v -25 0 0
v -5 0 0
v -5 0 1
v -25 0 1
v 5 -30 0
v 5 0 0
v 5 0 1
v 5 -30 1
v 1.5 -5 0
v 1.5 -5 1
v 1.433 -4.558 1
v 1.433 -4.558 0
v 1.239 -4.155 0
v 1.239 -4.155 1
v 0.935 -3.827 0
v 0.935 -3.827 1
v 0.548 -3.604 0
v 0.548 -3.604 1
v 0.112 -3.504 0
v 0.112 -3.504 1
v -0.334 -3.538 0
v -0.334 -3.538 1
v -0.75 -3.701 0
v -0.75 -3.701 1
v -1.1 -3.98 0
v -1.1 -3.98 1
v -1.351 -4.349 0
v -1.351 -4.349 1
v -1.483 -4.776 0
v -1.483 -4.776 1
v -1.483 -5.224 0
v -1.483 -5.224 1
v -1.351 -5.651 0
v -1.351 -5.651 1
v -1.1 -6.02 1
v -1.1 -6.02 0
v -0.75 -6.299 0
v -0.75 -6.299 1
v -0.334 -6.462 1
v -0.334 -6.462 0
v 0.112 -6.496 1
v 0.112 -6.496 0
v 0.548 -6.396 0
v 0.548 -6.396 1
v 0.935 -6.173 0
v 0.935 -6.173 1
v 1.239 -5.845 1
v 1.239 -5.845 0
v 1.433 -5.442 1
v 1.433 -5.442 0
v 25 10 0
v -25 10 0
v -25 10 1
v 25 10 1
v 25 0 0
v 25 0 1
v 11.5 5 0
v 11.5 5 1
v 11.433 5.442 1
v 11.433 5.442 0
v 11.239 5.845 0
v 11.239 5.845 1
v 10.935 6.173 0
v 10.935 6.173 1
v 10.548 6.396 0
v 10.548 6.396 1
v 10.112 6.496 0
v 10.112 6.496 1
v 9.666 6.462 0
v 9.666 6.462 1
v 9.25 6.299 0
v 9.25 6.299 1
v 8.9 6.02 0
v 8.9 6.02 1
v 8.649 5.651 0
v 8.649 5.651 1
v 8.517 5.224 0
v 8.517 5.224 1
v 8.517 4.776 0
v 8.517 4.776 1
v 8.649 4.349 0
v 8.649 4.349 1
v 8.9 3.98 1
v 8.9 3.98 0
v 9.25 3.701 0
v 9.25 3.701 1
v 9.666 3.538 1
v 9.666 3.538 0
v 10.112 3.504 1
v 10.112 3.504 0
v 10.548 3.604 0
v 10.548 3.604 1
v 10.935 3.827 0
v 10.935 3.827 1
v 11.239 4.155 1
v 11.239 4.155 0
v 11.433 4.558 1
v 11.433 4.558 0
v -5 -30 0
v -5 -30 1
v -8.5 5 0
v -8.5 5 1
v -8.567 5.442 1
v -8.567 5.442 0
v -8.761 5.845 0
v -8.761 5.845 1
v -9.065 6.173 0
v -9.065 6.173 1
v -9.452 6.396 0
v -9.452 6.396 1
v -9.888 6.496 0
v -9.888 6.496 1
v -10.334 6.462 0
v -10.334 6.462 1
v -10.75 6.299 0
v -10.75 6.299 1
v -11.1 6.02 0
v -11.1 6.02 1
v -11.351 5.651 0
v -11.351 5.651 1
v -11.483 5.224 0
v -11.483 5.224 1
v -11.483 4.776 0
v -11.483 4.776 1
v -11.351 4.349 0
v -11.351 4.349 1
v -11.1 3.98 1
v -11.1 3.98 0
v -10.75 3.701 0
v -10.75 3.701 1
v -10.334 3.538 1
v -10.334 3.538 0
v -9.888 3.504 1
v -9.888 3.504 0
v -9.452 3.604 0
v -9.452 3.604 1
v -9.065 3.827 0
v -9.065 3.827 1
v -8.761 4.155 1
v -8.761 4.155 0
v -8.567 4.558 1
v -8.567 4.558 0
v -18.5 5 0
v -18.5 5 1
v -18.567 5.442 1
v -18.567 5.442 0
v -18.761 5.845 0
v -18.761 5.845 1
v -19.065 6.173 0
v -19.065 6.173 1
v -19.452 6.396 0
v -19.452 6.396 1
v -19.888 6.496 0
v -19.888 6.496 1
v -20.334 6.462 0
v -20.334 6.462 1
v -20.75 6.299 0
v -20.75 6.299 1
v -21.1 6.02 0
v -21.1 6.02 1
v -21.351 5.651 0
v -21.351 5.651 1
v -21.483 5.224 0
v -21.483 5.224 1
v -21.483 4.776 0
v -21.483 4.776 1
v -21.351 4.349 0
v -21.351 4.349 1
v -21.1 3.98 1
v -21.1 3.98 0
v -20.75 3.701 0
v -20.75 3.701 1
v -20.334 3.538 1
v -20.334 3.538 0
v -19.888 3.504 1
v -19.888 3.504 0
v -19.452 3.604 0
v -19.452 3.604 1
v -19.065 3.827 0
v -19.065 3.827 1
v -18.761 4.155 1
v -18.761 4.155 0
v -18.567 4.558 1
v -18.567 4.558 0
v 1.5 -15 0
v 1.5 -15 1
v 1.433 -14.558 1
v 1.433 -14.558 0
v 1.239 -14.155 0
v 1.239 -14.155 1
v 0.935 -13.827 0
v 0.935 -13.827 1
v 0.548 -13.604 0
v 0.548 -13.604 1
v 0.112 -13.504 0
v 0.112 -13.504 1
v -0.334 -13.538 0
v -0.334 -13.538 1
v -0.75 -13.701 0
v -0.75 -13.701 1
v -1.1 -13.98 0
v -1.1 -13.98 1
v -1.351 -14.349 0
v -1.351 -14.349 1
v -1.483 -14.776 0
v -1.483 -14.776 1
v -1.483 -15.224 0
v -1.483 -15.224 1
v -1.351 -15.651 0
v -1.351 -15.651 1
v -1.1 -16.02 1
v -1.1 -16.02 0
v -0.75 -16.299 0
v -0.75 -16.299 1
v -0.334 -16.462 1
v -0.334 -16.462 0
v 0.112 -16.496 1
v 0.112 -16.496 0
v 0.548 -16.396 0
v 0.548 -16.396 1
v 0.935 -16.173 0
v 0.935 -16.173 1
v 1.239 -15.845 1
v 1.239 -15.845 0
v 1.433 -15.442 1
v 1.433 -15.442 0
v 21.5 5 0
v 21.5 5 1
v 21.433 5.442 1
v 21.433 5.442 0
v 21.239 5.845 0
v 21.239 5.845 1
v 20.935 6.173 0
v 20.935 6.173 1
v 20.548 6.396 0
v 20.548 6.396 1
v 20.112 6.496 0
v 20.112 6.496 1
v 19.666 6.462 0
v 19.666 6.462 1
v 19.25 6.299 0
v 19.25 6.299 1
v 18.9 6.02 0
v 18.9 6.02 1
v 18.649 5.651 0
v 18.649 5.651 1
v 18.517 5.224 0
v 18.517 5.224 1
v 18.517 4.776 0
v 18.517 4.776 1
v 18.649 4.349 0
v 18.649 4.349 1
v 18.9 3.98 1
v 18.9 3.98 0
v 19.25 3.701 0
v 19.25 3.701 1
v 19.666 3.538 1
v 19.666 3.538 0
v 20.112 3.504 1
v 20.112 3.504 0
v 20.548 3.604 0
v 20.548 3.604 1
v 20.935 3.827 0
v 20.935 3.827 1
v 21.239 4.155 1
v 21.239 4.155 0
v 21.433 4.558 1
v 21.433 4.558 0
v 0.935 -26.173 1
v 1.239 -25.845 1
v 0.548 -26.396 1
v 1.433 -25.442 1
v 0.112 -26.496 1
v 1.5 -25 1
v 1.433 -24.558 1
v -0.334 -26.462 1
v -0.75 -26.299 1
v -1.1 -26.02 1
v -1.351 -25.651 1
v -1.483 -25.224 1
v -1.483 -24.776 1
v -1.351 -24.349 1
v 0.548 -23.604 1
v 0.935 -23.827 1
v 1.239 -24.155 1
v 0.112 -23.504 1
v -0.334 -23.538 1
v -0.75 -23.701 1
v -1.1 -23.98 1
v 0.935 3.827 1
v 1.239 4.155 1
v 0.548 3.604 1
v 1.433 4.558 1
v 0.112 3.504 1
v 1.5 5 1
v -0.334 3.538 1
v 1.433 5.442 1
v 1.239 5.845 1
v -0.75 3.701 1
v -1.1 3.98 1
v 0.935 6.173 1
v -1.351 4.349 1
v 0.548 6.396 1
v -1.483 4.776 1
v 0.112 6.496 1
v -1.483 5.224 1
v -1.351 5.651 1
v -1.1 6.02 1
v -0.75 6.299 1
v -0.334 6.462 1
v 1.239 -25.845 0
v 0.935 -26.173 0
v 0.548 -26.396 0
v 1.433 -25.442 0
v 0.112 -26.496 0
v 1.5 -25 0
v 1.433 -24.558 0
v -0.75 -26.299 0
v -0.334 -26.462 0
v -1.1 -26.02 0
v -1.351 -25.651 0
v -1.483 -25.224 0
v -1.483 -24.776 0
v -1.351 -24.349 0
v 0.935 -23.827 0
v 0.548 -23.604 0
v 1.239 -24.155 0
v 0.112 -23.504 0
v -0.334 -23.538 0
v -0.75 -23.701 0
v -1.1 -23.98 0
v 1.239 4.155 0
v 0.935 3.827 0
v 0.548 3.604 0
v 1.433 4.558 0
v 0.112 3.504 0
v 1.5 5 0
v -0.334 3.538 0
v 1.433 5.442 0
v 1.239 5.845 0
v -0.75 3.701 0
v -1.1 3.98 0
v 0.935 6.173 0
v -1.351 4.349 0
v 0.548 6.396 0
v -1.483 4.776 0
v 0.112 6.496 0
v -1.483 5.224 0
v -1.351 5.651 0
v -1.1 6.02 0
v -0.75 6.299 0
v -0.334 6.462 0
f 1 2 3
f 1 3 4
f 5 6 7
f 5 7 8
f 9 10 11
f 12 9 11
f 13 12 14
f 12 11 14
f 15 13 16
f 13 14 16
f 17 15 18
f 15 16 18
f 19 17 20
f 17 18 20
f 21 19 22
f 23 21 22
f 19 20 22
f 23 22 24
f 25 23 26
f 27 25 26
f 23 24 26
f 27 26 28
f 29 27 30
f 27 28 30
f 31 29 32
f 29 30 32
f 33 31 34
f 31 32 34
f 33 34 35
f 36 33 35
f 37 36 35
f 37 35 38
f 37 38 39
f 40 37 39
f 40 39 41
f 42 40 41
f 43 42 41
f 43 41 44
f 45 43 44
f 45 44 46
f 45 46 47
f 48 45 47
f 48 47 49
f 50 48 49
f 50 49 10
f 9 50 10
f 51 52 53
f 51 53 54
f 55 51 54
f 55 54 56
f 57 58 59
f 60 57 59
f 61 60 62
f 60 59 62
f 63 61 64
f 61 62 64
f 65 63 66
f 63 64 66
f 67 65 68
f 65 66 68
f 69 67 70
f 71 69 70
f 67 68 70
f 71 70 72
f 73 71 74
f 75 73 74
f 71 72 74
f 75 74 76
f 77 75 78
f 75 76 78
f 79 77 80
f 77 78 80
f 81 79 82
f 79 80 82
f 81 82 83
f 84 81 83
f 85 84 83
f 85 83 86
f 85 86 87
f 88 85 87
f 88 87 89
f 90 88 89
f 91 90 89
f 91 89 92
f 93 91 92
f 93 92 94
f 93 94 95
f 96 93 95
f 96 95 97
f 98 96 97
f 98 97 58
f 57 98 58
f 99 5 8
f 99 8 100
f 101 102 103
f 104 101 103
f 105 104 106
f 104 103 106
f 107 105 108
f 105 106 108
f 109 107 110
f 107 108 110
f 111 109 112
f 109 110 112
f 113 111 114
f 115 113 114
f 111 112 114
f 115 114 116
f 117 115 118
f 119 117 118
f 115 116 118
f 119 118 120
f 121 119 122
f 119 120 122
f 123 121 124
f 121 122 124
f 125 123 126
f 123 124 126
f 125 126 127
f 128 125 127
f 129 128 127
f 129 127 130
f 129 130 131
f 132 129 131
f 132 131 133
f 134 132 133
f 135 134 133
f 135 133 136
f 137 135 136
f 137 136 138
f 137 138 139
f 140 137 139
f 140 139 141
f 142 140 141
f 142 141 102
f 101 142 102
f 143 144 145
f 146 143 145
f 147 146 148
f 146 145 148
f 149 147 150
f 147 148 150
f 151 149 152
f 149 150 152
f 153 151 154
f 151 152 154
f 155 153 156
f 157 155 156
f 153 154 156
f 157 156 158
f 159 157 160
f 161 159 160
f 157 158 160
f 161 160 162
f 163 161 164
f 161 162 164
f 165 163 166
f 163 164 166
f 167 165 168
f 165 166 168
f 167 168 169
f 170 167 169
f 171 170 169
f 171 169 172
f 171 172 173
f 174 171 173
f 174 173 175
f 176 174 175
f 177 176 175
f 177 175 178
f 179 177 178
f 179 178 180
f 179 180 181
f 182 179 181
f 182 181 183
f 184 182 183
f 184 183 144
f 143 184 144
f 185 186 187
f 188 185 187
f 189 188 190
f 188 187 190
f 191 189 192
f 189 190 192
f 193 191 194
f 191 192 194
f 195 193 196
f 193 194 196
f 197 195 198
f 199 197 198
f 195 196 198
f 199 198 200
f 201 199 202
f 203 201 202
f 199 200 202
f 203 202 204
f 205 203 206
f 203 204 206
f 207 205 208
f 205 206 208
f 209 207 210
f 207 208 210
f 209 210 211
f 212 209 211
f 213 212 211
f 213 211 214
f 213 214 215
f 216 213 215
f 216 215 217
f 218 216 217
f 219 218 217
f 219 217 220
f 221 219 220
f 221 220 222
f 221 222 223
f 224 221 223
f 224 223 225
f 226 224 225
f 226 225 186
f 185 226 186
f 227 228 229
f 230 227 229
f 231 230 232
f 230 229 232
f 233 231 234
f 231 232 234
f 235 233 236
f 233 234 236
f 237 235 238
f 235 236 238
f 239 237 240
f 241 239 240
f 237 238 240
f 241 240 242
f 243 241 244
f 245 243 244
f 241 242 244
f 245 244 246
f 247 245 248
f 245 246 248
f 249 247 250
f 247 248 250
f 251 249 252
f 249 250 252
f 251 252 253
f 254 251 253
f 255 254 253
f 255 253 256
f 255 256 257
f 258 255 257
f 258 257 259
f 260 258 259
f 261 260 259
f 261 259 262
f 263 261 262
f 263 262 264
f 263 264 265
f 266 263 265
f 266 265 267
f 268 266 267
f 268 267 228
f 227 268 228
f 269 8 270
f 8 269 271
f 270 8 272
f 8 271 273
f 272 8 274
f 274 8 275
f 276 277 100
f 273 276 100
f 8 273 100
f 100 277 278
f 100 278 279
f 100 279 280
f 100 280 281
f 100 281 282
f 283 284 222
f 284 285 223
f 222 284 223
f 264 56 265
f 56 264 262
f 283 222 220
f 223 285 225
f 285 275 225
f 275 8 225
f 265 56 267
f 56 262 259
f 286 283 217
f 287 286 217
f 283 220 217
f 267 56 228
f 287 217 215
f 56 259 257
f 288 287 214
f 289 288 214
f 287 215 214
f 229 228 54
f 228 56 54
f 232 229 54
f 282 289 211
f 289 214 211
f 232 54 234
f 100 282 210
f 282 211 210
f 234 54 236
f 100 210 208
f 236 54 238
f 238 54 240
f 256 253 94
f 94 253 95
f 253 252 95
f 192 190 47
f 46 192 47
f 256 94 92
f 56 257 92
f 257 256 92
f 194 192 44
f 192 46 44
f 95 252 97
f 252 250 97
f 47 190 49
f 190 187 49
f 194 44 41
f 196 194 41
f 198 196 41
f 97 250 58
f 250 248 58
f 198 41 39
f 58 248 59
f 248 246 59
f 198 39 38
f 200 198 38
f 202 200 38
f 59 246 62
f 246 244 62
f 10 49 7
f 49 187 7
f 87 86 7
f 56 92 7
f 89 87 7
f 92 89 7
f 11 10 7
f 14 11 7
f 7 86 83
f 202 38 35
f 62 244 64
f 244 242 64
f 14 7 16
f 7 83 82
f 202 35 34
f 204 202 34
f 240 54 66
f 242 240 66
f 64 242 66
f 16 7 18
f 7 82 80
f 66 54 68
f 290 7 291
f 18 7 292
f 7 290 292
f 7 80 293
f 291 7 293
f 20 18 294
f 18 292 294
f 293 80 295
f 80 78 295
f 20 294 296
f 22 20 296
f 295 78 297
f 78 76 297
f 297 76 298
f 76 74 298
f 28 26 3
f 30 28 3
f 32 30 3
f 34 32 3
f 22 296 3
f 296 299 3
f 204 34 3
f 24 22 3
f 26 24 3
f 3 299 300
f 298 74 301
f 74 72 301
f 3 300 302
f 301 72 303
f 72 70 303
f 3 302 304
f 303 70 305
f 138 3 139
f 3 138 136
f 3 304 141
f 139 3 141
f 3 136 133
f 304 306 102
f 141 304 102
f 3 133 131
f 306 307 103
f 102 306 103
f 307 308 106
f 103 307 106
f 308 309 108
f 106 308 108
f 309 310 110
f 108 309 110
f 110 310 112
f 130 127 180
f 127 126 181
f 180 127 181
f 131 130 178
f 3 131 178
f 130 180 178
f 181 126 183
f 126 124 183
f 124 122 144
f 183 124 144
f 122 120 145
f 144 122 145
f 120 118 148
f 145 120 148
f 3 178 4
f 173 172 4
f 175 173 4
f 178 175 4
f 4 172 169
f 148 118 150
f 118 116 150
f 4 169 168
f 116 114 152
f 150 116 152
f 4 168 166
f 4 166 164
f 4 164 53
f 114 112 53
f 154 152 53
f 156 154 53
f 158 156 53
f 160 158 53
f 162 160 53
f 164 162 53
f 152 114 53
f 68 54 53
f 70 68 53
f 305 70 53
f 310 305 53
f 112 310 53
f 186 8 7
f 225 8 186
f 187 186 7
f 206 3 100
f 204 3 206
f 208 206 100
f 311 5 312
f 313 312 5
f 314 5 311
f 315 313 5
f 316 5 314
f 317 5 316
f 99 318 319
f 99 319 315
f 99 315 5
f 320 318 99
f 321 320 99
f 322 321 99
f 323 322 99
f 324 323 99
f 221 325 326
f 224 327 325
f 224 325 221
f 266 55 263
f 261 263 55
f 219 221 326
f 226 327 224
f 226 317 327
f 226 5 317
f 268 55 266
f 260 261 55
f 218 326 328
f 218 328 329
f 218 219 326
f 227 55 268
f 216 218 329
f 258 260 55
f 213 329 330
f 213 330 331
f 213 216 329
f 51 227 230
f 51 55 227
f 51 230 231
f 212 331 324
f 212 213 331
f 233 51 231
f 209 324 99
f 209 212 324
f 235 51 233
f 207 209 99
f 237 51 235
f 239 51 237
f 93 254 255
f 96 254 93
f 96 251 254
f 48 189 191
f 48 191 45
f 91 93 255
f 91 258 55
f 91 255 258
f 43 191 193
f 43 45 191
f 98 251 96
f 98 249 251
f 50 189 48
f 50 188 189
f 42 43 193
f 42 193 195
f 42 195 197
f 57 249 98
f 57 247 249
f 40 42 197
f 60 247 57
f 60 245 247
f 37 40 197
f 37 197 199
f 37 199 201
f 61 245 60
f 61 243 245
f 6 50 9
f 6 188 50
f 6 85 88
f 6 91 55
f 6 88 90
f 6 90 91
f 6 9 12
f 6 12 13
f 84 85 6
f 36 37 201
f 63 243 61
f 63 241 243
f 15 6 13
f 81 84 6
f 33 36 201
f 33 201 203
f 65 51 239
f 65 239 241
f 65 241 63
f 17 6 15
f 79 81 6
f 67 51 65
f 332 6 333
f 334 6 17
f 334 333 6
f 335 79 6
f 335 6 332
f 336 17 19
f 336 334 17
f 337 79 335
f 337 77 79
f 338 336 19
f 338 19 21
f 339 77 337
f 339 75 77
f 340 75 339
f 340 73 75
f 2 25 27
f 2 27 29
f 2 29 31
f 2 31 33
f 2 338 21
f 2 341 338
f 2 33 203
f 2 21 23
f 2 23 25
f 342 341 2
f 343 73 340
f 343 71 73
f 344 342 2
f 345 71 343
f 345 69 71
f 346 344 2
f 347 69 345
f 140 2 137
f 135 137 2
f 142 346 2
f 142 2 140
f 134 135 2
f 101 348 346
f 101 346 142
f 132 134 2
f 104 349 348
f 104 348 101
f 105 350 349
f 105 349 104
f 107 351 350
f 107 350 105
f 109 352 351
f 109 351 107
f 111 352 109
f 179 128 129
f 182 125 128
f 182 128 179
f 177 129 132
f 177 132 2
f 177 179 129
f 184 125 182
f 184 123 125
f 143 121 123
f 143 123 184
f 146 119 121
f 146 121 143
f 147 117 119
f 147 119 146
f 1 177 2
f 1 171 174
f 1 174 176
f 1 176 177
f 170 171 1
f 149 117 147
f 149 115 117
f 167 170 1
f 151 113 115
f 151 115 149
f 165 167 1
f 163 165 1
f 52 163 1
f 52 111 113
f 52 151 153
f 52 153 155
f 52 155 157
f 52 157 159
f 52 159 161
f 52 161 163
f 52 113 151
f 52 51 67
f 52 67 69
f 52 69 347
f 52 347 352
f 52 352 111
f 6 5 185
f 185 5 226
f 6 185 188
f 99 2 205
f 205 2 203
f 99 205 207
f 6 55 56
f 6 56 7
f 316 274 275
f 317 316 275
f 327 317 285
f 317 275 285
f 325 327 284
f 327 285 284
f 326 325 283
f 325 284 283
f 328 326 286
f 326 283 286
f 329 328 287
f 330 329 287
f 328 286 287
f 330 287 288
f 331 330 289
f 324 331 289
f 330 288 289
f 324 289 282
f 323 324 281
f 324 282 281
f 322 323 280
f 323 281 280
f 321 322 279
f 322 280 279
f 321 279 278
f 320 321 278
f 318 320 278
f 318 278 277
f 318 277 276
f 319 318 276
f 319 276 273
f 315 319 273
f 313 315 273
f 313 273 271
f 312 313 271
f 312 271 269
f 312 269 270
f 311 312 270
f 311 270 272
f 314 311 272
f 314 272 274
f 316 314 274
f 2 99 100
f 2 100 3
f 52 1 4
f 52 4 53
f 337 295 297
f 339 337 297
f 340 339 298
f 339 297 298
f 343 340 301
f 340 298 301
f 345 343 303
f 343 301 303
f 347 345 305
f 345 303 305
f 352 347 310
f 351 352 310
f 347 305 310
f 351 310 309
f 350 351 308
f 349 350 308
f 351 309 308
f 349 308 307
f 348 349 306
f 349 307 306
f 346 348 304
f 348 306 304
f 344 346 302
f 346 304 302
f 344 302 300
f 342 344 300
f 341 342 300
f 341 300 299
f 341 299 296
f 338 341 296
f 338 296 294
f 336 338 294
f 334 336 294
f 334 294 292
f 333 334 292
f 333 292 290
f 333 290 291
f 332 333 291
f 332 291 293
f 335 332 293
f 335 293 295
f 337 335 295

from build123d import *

# Parameters (mm, degrees)
BOSS_EXTRU_1_DEPTH         = 1
ESQUISSE2_R                = 1.5
ENL_V_MAT_EXTRU_1_DEPTH    = 2
R_P_TITION_LIN_AIRE1_COUNT = 3
R_P_TITION_LIN_AIRE1_PITCH = 10
R_P_TITION_LIN_AIRE2_COUNT = 3
R_P_TITION_LIN_AIRE2_PITCH = 10
R_P_TITION_LIN_AIRE3_COUNT = 4
R_P_TITION_LIN_AIRE3_PITCH = 10


with BuildPart() as part:
    # Esquisse1 → Boss.-Extru.1 (new body)
    with BuildSketch(Plane.XY):
        Polygon((-25, 10), (25, 10), (25, 0), (5, 0), (5, -30), (-5, -30), (-5, 0), (-25, 0), align=None)
    extrude(amount=BOSS_EXTRU_1_DEPTH)

    # Esquisse2 → Enlèv. mat.-Extru.1 (cut, through all)
    with BuildSketch(Plane.XY.offset(1)):
        with Locations((0, 5)):
            Circle(ESQUISSE2_R)
    enl_v_mat_extru_1 = extrude(amount=-ENL_V_MAT_EXTRU_1_DEPTH, mode=Mode.SUBTRACT)

    # Répétition linéaire1: Enlèv. mat.-Extru.1 ×3
    with Locations(*[(-i * R_P_TITION_LIN_AIRE1_PITCH, 0, 0) for i in range(1, R_P_TITION_LIN_AIRE1_COUNT)]):
        add(enl_v_mat_extru_1, mode=Mode.SUBTRACT)

    # Répétition linéaire2: Enlèv. mat.-Extru.1 ×3
    with Locations(*[(i * R_P_TITION_LIN_AIRE2_PITCH, 0, 0) for i in range(1, R_P_TITION_LIN_AIRE2_COUNT)]):
        add(enl_v_mat_extru_1, mode=Mode.SUBTRACT)

    # Répétition linéaire3: Enlèv. mat.-Extru.1 ×4
    with Locations(*[(0, -i * R_P_TITION_LIN_AIRE3_PITCH, 0) for i in range(1, R_P_TITION_LIN_AIRE3_COUNT)]):
        add(enl_v_mat_extru_1, mode=Mode.SUBTRACT)


solid = part.part
